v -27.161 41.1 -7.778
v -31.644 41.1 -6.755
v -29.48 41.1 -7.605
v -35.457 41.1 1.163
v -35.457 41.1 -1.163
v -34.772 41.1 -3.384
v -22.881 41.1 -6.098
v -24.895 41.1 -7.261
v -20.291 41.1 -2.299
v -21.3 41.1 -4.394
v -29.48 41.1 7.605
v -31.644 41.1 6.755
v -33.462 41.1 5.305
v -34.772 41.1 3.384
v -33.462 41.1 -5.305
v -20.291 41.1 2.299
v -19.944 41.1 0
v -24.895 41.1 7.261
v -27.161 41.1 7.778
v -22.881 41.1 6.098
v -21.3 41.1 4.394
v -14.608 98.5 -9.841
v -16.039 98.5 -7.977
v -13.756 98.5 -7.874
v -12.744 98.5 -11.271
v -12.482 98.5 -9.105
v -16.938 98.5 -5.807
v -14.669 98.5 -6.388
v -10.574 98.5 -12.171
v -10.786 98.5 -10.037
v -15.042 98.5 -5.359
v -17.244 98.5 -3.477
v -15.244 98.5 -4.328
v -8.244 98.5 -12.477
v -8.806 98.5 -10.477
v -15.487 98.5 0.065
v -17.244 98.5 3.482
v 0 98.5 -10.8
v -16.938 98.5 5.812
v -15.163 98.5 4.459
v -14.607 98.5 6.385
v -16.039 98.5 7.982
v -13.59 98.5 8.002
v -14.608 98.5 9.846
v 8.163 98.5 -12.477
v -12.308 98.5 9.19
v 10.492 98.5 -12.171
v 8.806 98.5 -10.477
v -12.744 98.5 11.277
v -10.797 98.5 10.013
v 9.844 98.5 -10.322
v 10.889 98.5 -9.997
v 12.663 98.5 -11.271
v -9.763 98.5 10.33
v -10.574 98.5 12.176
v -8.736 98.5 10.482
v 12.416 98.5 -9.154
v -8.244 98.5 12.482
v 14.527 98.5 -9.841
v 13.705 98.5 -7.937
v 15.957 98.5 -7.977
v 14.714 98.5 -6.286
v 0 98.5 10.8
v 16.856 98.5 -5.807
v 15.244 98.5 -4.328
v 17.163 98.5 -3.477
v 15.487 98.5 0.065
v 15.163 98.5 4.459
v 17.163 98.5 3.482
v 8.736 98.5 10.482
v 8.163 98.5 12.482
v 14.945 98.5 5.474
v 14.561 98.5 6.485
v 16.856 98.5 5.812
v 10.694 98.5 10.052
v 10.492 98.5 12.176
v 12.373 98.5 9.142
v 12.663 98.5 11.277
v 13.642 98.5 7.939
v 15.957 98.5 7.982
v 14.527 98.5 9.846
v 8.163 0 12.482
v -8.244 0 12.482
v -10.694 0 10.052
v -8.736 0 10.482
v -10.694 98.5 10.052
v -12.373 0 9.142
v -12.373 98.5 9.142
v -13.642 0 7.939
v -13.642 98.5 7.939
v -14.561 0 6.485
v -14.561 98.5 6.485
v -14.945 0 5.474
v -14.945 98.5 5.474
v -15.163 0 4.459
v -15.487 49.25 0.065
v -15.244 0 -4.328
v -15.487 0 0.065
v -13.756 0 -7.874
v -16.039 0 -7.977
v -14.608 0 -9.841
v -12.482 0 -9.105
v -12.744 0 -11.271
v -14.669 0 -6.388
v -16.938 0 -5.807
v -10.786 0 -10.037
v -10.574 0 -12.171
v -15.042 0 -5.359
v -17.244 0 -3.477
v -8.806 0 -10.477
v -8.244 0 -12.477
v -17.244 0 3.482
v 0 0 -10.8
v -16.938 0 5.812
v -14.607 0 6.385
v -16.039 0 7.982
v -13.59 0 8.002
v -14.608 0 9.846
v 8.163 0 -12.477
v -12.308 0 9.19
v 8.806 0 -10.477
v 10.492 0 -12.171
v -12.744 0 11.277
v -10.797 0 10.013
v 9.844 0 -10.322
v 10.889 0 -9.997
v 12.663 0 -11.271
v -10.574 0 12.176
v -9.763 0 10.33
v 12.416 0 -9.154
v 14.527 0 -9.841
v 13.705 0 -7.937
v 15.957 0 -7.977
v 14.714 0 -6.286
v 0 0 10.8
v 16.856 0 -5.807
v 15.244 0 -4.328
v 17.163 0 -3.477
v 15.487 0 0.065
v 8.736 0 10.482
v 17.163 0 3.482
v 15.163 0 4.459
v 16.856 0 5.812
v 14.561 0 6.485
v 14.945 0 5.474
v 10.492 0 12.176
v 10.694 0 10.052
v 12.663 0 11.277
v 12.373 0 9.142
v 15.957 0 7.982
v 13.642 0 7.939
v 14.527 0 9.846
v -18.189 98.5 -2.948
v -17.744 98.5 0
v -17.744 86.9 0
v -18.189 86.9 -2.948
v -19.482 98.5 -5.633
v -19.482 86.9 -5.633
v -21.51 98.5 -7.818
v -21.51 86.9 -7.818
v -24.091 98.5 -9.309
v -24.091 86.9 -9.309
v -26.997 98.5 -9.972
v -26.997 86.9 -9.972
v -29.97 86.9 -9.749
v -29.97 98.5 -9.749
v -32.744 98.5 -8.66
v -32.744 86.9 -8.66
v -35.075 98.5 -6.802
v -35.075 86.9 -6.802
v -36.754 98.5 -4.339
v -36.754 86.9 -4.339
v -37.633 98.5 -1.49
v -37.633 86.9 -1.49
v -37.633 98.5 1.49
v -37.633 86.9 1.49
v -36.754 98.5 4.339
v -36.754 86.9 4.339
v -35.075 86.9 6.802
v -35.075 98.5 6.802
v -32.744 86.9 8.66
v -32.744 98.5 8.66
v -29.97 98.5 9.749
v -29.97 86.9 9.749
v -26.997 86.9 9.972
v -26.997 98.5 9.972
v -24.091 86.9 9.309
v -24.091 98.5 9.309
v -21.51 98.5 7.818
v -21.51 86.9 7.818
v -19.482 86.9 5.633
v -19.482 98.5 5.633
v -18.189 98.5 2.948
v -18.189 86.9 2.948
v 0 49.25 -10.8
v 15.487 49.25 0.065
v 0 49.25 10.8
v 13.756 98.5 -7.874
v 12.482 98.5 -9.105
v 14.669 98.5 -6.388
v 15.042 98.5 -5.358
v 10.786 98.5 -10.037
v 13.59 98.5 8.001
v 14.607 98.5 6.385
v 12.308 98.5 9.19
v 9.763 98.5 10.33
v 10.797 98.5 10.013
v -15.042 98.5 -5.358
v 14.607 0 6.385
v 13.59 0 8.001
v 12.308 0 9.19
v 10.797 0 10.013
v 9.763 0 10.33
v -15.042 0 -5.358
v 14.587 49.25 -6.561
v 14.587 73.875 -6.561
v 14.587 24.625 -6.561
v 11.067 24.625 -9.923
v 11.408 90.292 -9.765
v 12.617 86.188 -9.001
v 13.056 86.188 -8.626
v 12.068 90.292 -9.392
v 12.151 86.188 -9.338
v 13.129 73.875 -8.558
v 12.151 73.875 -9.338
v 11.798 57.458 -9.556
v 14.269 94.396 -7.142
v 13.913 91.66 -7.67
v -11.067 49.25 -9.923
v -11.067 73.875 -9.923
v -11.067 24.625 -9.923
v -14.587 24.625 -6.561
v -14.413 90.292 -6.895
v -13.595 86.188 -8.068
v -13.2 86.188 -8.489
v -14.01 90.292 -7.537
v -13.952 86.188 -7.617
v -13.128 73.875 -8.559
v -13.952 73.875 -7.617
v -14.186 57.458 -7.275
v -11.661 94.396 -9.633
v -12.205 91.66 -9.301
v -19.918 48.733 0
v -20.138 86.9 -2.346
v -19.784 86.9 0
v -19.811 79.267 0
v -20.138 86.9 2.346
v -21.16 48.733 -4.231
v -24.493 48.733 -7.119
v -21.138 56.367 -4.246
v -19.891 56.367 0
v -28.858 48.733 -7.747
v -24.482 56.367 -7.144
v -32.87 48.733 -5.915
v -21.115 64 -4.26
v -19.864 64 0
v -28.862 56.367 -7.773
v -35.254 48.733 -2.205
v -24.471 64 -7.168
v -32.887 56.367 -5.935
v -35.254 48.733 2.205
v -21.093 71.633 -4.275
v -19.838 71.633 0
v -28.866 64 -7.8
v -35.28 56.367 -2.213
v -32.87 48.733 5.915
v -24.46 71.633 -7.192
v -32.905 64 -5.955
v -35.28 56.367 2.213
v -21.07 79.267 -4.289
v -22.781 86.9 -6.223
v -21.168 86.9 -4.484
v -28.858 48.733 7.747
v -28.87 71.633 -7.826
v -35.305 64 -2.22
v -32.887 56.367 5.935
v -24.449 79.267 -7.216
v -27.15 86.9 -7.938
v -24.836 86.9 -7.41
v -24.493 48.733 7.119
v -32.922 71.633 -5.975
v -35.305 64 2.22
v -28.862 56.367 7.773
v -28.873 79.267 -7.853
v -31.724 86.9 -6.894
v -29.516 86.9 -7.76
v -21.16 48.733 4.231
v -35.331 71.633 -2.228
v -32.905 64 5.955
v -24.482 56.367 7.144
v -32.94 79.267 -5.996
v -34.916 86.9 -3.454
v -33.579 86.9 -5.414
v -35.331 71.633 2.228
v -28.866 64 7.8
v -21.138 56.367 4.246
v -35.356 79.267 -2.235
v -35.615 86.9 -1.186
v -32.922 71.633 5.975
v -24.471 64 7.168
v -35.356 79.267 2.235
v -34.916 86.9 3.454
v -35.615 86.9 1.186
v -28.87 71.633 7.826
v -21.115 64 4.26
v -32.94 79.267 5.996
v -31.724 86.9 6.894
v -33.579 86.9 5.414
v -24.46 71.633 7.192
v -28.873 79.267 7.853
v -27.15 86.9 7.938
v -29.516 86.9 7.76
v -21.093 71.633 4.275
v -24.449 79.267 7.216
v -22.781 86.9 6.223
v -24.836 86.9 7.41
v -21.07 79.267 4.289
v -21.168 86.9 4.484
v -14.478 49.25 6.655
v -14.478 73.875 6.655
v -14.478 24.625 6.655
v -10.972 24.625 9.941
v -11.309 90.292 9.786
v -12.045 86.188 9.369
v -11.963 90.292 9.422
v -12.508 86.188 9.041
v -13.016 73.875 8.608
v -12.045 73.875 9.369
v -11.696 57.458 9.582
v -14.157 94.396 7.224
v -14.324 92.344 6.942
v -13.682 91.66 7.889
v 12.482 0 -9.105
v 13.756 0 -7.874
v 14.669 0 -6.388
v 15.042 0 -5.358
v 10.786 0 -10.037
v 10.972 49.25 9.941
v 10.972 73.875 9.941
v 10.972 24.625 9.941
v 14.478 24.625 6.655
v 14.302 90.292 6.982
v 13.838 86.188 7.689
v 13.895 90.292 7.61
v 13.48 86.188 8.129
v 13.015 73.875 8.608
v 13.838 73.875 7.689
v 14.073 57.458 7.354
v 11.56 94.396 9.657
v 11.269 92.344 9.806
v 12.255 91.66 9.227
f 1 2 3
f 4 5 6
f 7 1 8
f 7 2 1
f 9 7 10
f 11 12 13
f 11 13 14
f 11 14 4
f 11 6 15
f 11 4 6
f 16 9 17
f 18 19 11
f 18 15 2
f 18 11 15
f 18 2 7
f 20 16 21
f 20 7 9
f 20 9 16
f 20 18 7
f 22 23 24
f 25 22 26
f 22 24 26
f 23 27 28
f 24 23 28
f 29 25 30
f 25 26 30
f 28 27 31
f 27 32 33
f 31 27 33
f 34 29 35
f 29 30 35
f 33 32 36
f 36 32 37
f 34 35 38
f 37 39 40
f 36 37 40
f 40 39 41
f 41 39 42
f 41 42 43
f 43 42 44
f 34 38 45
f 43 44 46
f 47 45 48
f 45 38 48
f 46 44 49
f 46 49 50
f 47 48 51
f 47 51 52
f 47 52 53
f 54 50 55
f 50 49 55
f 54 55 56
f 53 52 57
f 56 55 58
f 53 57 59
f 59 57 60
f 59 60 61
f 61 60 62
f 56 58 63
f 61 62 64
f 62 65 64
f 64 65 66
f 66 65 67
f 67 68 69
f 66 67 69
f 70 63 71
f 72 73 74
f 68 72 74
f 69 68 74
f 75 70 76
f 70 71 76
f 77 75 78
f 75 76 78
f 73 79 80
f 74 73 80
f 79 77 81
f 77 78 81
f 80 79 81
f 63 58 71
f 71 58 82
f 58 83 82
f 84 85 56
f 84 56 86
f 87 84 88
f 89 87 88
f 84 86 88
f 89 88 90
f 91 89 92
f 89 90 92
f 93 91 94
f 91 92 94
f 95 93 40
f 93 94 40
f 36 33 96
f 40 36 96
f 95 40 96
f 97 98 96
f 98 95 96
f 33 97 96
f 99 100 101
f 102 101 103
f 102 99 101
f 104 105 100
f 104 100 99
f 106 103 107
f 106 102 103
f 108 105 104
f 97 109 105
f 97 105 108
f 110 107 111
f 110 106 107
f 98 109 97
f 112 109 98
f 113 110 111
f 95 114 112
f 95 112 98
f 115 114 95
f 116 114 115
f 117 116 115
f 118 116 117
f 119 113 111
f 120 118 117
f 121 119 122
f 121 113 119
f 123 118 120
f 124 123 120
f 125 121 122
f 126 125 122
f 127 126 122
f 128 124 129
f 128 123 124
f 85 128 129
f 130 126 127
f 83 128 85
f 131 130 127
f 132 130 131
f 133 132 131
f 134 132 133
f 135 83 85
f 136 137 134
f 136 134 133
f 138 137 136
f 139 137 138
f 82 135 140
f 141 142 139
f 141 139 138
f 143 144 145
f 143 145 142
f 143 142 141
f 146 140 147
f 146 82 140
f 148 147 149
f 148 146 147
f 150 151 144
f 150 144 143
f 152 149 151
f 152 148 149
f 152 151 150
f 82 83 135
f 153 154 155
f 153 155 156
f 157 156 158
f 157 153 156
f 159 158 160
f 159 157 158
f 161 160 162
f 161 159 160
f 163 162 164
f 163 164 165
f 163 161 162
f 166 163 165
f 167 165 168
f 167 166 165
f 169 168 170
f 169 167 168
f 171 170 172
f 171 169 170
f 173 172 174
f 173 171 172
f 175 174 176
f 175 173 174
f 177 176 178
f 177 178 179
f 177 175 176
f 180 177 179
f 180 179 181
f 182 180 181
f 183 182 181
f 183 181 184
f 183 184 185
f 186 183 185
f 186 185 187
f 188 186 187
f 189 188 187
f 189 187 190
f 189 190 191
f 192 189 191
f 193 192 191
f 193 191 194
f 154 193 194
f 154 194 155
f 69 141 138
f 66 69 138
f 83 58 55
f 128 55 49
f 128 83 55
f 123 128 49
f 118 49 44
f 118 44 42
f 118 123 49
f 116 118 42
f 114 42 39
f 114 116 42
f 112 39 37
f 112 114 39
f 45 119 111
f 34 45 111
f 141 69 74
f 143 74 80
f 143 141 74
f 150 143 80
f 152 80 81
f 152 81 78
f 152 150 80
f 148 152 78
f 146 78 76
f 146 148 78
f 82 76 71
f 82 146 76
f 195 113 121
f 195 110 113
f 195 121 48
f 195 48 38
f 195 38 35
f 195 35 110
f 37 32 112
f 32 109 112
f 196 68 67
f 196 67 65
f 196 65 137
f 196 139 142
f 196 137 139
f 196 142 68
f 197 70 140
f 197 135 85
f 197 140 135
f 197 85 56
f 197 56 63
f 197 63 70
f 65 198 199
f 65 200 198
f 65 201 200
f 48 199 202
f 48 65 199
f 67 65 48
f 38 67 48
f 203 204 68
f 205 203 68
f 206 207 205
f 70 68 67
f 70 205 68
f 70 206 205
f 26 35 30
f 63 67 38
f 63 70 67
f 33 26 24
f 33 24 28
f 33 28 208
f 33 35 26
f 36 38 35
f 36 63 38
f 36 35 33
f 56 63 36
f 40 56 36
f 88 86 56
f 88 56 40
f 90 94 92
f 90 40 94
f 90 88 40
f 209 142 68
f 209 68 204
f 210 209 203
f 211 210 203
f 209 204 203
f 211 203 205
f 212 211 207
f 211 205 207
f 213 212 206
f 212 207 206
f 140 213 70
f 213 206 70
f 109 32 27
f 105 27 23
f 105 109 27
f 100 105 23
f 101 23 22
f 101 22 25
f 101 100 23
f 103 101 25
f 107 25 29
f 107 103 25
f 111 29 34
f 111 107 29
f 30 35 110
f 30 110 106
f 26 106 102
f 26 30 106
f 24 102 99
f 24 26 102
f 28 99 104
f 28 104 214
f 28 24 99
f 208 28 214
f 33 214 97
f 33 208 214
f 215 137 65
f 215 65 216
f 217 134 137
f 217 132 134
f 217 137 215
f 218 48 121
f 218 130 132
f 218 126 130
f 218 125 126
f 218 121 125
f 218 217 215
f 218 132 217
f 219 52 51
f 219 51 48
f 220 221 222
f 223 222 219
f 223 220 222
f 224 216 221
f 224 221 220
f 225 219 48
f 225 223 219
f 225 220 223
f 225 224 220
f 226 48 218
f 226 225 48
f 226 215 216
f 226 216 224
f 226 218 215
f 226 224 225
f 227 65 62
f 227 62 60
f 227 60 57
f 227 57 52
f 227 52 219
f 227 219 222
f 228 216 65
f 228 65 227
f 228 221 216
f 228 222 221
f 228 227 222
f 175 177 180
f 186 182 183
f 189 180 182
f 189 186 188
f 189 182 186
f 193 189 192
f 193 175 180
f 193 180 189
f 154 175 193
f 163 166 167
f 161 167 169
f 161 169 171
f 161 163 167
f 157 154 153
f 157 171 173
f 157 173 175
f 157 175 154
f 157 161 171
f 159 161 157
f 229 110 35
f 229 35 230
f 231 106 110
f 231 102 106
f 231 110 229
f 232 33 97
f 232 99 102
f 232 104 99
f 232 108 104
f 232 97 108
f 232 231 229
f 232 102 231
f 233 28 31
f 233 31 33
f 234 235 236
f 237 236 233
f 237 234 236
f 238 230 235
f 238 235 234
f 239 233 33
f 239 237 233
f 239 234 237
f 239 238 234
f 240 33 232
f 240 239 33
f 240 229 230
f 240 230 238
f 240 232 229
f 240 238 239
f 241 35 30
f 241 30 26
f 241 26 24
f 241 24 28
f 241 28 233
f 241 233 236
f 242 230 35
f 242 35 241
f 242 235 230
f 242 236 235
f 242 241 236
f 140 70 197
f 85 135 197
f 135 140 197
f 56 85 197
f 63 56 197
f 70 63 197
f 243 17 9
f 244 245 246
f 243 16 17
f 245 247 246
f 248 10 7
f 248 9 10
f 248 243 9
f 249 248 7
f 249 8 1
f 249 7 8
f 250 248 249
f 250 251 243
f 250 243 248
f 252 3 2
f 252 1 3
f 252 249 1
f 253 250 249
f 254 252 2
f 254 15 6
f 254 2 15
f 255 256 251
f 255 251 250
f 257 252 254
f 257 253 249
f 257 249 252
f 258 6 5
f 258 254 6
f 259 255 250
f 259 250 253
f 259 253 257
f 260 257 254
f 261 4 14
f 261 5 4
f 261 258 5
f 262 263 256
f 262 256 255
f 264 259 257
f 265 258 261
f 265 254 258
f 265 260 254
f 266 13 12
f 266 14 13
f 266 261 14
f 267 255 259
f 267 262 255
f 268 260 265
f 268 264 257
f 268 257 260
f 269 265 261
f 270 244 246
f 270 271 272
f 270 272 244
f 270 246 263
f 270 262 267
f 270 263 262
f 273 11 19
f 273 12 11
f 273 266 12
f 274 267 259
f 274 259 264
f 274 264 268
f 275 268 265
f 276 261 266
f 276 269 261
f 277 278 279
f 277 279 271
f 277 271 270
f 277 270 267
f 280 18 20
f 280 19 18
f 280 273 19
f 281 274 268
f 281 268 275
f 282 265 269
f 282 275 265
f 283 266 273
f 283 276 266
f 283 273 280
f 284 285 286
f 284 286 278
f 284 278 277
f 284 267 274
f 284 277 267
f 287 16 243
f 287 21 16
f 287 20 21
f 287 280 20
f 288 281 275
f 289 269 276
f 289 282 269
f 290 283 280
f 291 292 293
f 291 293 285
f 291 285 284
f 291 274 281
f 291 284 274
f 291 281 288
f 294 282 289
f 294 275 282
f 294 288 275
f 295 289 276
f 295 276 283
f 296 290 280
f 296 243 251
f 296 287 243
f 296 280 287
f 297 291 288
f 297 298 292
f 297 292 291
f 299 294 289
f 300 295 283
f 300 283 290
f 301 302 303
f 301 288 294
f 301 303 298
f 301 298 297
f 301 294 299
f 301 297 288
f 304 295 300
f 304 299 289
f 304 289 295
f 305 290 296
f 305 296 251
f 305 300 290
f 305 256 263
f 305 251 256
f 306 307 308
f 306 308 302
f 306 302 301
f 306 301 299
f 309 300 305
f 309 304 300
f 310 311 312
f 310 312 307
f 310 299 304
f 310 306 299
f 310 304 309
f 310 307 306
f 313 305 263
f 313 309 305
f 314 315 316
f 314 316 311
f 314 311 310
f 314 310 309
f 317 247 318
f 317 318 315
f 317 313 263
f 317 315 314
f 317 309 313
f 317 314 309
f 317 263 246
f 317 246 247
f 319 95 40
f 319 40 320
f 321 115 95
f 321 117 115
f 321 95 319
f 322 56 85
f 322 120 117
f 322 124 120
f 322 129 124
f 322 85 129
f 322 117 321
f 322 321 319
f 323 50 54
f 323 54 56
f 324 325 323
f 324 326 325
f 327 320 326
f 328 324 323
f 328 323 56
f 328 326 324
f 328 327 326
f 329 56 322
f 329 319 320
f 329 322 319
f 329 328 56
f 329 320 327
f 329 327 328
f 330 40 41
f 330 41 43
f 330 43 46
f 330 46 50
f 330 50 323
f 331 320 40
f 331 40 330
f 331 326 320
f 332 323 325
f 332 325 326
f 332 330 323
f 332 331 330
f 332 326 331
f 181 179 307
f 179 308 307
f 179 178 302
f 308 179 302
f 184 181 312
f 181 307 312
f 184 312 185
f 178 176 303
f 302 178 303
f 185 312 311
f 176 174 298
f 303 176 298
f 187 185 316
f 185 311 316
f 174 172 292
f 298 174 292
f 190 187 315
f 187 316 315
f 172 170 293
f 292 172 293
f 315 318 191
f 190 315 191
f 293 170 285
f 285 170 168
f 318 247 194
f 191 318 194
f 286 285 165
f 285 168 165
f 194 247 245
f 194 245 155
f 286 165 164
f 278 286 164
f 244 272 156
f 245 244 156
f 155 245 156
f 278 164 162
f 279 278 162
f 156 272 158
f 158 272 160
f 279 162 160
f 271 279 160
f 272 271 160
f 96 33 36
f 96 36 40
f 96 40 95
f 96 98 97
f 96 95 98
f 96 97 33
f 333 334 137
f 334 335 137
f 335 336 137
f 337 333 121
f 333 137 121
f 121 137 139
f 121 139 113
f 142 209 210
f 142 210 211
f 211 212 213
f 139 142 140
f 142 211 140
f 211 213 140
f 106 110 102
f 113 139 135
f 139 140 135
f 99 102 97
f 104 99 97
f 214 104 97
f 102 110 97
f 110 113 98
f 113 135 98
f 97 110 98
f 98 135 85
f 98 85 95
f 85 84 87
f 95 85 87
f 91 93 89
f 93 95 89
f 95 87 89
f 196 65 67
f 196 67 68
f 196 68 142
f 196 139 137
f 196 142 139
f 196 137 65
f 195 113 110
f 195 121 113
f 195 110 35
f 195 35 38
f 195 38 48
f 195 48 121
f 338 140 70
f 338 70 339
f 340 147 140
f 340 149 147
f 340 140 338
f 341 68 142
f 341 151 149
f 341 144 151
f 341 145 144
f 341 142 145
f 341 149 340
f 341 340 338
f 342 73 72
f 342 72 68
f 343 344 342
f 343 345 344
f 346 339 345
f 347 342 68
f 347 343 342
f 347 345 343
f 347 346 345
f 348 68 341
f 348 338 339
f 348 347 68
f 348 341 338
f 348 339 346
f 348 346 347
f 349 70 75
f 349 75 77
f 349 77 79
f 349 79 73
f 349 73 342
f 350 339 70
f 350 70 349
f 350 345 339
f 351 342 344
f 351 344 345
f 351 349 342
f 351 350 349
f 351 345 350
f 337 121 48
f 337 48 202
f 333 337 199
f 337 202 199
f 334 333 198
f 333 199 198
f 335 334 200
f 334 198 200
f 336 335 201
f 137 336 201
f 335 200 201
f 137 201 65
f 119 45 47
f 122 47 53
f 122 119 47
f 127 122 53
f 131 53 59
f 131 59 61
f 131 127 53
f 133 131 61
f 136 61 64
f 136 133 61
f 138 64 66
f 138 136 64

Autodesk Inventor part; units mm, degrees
ref_plane "YZ Plane" through (0, 0, 0) normal (1, 0, 0) x (0, 1, 0)
ref_plane "XZ Plane" through (0, 0, 0) normal (0, 1, 0) x (-1, 0, 0)
ref_plane "XY Plane" through (0, 0, 0) normal (0, 0, 1) x (1, 0, 0)
sketch "Sketch1" plane through (0, 0, 0) normal (0, 1, 0) x (-1, 0, 0)
  line L0 (15.5, -10.8) -> (-15.5, -10.8) construction
  line L1 (-15.5, -10.8) -> (-15.5, 10.8) construction
  line L2 (-15.5, 10.8) -> (15.5, 10.8) construction
  line L3 (15.5, 10.8) -> (15.5, -10.8) construction
  line L4 (15.5, -9.8) -> (0, -11.8) construction
  line L5 (0, -11.8) -> (-15.5, -9.8) construction
  spline S0 degree 2 poles (15.5, -9.8) (0, -11.8) (-15.5, -9.8) knots 1 1 1 2 2 2
  line L6 (15.5, 9.8) -> (0, 11.8) construction
  line L7 (0, 11.8) -> (-15.5, 9.8) construction
  spline S1 degree 2 poles (15.5, 9.8) (0, 11.8) (-15.5, 9.8) knots 1 1 1 2 2 2
  line L8 (-15.5, -9.8) -> (-15.5, 9.8)
  line L9 (15.5, 9.8) -> (15.5, -9.8)
  line L10 (13.5, -10.8) -> (13.3899, -12.4573) construction
  line L11 (13.3858, 11.8689) -> (13.5, 10.8) construction
  spline S2 degree 2 poles (13.95, 9.99) (13.3858, 11.8689) (13.5, 10.8) knots 0 0 0 1 1 1 construction
  spline S3 degree 2 poles (13.5, -10.8) (13.3899, -12.4573) (14.1, -9.9725) knots 0 0 0 1 1 1 construction
  line L12 (13.3899, -12.4573) -> (14.1, -9.9725) construction
  line L13 (14.1, -9.9725) -> (16.95, 0) construction
  spline S4 degree 2 poles (14.1, -9.9725) (16.95, 0) (13.95, 9.99) knots 1.076223 1.076223 1.076223 1.923777 1.923777 1.923777
  line L14 (16.95, 0) -> (13.95, 9.99) construction
  line L15 (13.95, 9.99) -> (13.3858, 11.8689) construction
  line L16 (0, 3.4411) -> (0, -4.0542)
  line L17 (-14.1, -9.9725) -> (-16.95, 0) construction
  spline S5 degree 2 poles (-14.1, -9.9725) (-16.95, 0) (-13.95, 9.99) knots 1.076223 1.076223 1.076223 1.923777 1.923777 1.923777
  line L18 (-16.95, 0) -> (-13.95, 9.99) construction
  point P0 (0, 0)
  point P1 (-15.977, 0)
  point P2 (-15.977, 0)
  point P3 (15.5, 0)
  point P4 (-15.5, 0)
  point P5 (15.5, 0)
  point P6 (-15.5, -1.3514)
  point P7 (-14.1, -9.9725)
  point P8 (15.5, -1.3514)
  point P9 (15.5, 1.0529)
  point P10 (-13.95, 9.99)
  point P11 (-15.5, 1.0529)
  dimension "d0" = 31
  dimension "d1" = 15.5
  dimension "d2" = 21.6
  dimension "d3" = 10.8
  dimension "d6" = 1
  dimension "d7" = 15.5
  dimension "d8" = 2
  dimension "d10" = 2
  dimension "d13" = 1.55
  dimension "d14" = 1.4
  dimension "d15" = 3
extrude "Extrusion1" add sketch "Sketch1" along normal blind 98.5 contours S0 S5 S1 S4
fillet "Fillet1" radius 7 4 edges at (13.95, 49.25, 9.99) (-13.95, 49.25, 9.99) (14.1, 49.25, -9.9725) (-14.1, 49.25, -9.9725)
sketch "Sketch2" plane through (0, 0, 0) normal (0, -1, 0) x (1, 0, 0)
  spline S0 degree 6 poles (-8.8058, -10.4772) (-9.1759, -10.4501) (-9.5527, -10.3988) (-9.9335, -10.3215) (-10.3153, -10.2169) (-10.6942, -10.0841) (-11.4392, -9.7628) (-11.8052, -9.5742) (-12.1608, -9.3579) (-12.5022, -9.1149) (-12.8258, -8.8475) (-13.4314, -8.2691) (-13.7134, -7.9582) (-13.9718, -7.6284) (-14.2043, -7.283) (-14.4095, -6.9261) (-14.7648, -6.1967) (-14.9148, -5.8243) (-15.037, -5.4478) (-15.1317, -5.0709) (-15.2002, -4.6969) (-15.2444, -4.3284) knots 0 0 0 0 0 0 0 0.249928 0.249928 0.249928 0.249928 0.249928 0.5 0.5 0.5 0.5 0.5 0.750072 0.750072 0.750072 0.750072 0.750072 1 1 1 1 1 1 1 projected
  spline S1 degree 2 poles (8.8058, -10.4772) (0, -11.1228) (-8.8058, -10.4772) knots 0 0 0 1 1 1 projected
  spline S2 degree 6 poles (15.2444, -4.3284) (15.2002, -4.6969) (15.1317, -5.0709) (15.037, -5.4478) (14.9148, -5.8243) (14.7648, -6.1967) (14.4095, -6.9261) (14.2043, -7.283) (13.9718, -7.6284) (13.7134, -7.9582) (13.4314, -8.2691) (12.8258, -8.8475) (12.5022, -9.1149) (12.1608, -9.3579) (11.8052, -9.5742) (11.4392, -9.7628) (10.6942, -10.0841) (10.3153, -10.2169) (9.9335, -10.3215) (9.5527, -10.3988) (9.1759, -10.4501) (8.8058, -10.4772) knots 0 0 0 0 0 0 0 0.249928 0.249928 0.249928 0.249928 0.249928 0.5 0.5 0.5 0.5 0.5 0.750072 0.750072 0.750072 0.750072 0.750072 1 1 1 1 1 1 1 projected
  spline S3 degree 2 poles (15.1628, 4.4592) (15.7704, 0.0637) (15.2444, -4.3284) knots 0 0 0 1 1 1 projected
  spline S4 degree 6 poles (8.7365, 10.4823) (9.1027, 10.4557) (9.4753, 10.4054) (9.8517, 10.3298) (10.229, 10.2274) (10.6036, 10.0977) (11.3404, 9.7839) (11.7025, 9.5998) (12.0547, 9.3886) (12.3931, 9.1516) (12.7144, 8.8905) (13.3169, 8.3258) (13.5982, 8.0221) (13.8567, 7.6997) (14.0902, 7.3619) (14.2974, 7.0125) (14.6582, 6.2976) (14.8119, 5.9321) (14.9384, 5.5623) (15.0383, 5.1915) (15.1125, 4.8229) (15.1628, 4.4592) knots 0 0 0 0 0 0 0 0.249931 0.249931 0.249931 0.249931 0.249931 0.5 0.5 0.5 0.5 0.5 0.750069 0.750069 0.750069 0.750069 0.750069 1 1 1 1 1 1 1 projected
  spline S5 degree 2 poles (-8.7365, 10.4823) (0, 11.1177) (8.7365, 10.4823) knots 0 0 0 1 1 1 projected
  spline S6 degree 6 poles (-15.1628, 4.4592) (-15.1125, 4.8229) (-15.0383, 5.1915) (-14.9384, 5.5623) (-14.8119, 5.9321) (-14.6582, 6.2976) (-14.2974, 7.0125) (-14.0902, 7.3619) (-13.8567, 7.6997) (-13.5982, 8.0221) (-13.3169, 8.3258) (-12.7144, 8.8905) (-12.3931, 9.1516) (-12.0547, 9.3886) (-11.7025, 9.5998) (-11.3404, 9.7839) (-10.6036, 10.0977) (-10.229, 10.2274) (-9.8517, 10.3298) (-9.4753, 10.4054) (-9.1027, 10.4557) (-8.7365, 10.4823) knots 0 0 0 0 0 0 0 0.249931 0.249931 0.249931 0.249931 0.249931 0.5 0.5 0.5 0.5 0.5 0.750069 0.750069 0.750069 0.750069 0.750069 1 1 1 1 1 1 1 projected
  spline S7 degree 2 poles (-15.2444, -4.3284) (-15.7704, 0.0637) (-15.1628, 4.4592) knots 0 0 0 1 1 1 projected
  line L0 (-8.2444, 12.4823) -> (8.1628, 12.4823)
  line L1 (17.1628, 3.4823) -> (17.1628, -3.4772)
  line L2 (8.1628, -12.4772) -> (-8.2444, -12.4772)
  line L3 (-17.2444, -3.4772) -> (-17.2444, 3.4823)
  arc A0 (-8.2444, 12.4823) -> (-17.2444, 3.4823) centre (-8.2444, 3.4823) ccw
  arc A1 (17.1628, 3.4823) -> (8.1628, 12.4823) centre (8.1628, 3.4823) ccw
  arc A2 (8.1628, -12.4772) -> (17.1628, -3.4772) centre (8.1628, -3.4772) ccw
  arc A3 (-17.2444, -3.4772) -> (-8.2444, -12.4772) centre (-8.2444, -3.4772) ccw
  point P0 (0, 0)
  dimension "d17" = 2
  dimension "d18" = 2
  dimension "d19" = 2
  dimension "d20" = 2
  dimension "d21" = 9
extrude "Extrusion2" add sketch "Sketch2" against normal up to surface (98.5 mm away) separate body
sketch "Sketch3" plane through (-8.2444, 98.5, -12.4772) normal (0, 1, 0) x (1, 0, 0)
  circle A0 centre (-19.5, -12.4772) radius 10
  line L0 (-9, -15.9595) -> (-9, -9) projected
  point P0 (8.2444, -12.4772)
  dimension "d24" = 20
  dimension "d25" = 10.5
extrude "Extrusion3" add sketch "Sketch3" against normal blind 11.6 separate body
sketch "Sketch4" plane through (-27.7444, 86.9, 0) normal (0, -1, 0) x (1, 0, 0)
  circle A0 centre (0, 0) radius 7.96
  circle A1 centre (0, 0) radius 10 projected
  point P0 (27.7444, 0)
  dimension "d28" = 15.92
extrude "Extrusion4" add sketch "Sketch4" along normal blind 45.8 draft -0.2 contours A0 bodies 3
sketch "Sketch5" plane through (-27.7444, 41.1, 0) normal (0, -1, 0) x (1, 0, 0)
  circle A0 centre (0, 0) radius 7.8001 projected
  point P0 (27.7444, 0)
  dimension "d31" = 15.6003
equation "\"d1\" = 0.5 * d0"
equation "\"d3\" = 0.5 * d2"
equation "\"d7\" = d1"
equation "\"d19\" = d18"
equation "\"d20\" = d18"
properties part number "vape-tube-test-print"
